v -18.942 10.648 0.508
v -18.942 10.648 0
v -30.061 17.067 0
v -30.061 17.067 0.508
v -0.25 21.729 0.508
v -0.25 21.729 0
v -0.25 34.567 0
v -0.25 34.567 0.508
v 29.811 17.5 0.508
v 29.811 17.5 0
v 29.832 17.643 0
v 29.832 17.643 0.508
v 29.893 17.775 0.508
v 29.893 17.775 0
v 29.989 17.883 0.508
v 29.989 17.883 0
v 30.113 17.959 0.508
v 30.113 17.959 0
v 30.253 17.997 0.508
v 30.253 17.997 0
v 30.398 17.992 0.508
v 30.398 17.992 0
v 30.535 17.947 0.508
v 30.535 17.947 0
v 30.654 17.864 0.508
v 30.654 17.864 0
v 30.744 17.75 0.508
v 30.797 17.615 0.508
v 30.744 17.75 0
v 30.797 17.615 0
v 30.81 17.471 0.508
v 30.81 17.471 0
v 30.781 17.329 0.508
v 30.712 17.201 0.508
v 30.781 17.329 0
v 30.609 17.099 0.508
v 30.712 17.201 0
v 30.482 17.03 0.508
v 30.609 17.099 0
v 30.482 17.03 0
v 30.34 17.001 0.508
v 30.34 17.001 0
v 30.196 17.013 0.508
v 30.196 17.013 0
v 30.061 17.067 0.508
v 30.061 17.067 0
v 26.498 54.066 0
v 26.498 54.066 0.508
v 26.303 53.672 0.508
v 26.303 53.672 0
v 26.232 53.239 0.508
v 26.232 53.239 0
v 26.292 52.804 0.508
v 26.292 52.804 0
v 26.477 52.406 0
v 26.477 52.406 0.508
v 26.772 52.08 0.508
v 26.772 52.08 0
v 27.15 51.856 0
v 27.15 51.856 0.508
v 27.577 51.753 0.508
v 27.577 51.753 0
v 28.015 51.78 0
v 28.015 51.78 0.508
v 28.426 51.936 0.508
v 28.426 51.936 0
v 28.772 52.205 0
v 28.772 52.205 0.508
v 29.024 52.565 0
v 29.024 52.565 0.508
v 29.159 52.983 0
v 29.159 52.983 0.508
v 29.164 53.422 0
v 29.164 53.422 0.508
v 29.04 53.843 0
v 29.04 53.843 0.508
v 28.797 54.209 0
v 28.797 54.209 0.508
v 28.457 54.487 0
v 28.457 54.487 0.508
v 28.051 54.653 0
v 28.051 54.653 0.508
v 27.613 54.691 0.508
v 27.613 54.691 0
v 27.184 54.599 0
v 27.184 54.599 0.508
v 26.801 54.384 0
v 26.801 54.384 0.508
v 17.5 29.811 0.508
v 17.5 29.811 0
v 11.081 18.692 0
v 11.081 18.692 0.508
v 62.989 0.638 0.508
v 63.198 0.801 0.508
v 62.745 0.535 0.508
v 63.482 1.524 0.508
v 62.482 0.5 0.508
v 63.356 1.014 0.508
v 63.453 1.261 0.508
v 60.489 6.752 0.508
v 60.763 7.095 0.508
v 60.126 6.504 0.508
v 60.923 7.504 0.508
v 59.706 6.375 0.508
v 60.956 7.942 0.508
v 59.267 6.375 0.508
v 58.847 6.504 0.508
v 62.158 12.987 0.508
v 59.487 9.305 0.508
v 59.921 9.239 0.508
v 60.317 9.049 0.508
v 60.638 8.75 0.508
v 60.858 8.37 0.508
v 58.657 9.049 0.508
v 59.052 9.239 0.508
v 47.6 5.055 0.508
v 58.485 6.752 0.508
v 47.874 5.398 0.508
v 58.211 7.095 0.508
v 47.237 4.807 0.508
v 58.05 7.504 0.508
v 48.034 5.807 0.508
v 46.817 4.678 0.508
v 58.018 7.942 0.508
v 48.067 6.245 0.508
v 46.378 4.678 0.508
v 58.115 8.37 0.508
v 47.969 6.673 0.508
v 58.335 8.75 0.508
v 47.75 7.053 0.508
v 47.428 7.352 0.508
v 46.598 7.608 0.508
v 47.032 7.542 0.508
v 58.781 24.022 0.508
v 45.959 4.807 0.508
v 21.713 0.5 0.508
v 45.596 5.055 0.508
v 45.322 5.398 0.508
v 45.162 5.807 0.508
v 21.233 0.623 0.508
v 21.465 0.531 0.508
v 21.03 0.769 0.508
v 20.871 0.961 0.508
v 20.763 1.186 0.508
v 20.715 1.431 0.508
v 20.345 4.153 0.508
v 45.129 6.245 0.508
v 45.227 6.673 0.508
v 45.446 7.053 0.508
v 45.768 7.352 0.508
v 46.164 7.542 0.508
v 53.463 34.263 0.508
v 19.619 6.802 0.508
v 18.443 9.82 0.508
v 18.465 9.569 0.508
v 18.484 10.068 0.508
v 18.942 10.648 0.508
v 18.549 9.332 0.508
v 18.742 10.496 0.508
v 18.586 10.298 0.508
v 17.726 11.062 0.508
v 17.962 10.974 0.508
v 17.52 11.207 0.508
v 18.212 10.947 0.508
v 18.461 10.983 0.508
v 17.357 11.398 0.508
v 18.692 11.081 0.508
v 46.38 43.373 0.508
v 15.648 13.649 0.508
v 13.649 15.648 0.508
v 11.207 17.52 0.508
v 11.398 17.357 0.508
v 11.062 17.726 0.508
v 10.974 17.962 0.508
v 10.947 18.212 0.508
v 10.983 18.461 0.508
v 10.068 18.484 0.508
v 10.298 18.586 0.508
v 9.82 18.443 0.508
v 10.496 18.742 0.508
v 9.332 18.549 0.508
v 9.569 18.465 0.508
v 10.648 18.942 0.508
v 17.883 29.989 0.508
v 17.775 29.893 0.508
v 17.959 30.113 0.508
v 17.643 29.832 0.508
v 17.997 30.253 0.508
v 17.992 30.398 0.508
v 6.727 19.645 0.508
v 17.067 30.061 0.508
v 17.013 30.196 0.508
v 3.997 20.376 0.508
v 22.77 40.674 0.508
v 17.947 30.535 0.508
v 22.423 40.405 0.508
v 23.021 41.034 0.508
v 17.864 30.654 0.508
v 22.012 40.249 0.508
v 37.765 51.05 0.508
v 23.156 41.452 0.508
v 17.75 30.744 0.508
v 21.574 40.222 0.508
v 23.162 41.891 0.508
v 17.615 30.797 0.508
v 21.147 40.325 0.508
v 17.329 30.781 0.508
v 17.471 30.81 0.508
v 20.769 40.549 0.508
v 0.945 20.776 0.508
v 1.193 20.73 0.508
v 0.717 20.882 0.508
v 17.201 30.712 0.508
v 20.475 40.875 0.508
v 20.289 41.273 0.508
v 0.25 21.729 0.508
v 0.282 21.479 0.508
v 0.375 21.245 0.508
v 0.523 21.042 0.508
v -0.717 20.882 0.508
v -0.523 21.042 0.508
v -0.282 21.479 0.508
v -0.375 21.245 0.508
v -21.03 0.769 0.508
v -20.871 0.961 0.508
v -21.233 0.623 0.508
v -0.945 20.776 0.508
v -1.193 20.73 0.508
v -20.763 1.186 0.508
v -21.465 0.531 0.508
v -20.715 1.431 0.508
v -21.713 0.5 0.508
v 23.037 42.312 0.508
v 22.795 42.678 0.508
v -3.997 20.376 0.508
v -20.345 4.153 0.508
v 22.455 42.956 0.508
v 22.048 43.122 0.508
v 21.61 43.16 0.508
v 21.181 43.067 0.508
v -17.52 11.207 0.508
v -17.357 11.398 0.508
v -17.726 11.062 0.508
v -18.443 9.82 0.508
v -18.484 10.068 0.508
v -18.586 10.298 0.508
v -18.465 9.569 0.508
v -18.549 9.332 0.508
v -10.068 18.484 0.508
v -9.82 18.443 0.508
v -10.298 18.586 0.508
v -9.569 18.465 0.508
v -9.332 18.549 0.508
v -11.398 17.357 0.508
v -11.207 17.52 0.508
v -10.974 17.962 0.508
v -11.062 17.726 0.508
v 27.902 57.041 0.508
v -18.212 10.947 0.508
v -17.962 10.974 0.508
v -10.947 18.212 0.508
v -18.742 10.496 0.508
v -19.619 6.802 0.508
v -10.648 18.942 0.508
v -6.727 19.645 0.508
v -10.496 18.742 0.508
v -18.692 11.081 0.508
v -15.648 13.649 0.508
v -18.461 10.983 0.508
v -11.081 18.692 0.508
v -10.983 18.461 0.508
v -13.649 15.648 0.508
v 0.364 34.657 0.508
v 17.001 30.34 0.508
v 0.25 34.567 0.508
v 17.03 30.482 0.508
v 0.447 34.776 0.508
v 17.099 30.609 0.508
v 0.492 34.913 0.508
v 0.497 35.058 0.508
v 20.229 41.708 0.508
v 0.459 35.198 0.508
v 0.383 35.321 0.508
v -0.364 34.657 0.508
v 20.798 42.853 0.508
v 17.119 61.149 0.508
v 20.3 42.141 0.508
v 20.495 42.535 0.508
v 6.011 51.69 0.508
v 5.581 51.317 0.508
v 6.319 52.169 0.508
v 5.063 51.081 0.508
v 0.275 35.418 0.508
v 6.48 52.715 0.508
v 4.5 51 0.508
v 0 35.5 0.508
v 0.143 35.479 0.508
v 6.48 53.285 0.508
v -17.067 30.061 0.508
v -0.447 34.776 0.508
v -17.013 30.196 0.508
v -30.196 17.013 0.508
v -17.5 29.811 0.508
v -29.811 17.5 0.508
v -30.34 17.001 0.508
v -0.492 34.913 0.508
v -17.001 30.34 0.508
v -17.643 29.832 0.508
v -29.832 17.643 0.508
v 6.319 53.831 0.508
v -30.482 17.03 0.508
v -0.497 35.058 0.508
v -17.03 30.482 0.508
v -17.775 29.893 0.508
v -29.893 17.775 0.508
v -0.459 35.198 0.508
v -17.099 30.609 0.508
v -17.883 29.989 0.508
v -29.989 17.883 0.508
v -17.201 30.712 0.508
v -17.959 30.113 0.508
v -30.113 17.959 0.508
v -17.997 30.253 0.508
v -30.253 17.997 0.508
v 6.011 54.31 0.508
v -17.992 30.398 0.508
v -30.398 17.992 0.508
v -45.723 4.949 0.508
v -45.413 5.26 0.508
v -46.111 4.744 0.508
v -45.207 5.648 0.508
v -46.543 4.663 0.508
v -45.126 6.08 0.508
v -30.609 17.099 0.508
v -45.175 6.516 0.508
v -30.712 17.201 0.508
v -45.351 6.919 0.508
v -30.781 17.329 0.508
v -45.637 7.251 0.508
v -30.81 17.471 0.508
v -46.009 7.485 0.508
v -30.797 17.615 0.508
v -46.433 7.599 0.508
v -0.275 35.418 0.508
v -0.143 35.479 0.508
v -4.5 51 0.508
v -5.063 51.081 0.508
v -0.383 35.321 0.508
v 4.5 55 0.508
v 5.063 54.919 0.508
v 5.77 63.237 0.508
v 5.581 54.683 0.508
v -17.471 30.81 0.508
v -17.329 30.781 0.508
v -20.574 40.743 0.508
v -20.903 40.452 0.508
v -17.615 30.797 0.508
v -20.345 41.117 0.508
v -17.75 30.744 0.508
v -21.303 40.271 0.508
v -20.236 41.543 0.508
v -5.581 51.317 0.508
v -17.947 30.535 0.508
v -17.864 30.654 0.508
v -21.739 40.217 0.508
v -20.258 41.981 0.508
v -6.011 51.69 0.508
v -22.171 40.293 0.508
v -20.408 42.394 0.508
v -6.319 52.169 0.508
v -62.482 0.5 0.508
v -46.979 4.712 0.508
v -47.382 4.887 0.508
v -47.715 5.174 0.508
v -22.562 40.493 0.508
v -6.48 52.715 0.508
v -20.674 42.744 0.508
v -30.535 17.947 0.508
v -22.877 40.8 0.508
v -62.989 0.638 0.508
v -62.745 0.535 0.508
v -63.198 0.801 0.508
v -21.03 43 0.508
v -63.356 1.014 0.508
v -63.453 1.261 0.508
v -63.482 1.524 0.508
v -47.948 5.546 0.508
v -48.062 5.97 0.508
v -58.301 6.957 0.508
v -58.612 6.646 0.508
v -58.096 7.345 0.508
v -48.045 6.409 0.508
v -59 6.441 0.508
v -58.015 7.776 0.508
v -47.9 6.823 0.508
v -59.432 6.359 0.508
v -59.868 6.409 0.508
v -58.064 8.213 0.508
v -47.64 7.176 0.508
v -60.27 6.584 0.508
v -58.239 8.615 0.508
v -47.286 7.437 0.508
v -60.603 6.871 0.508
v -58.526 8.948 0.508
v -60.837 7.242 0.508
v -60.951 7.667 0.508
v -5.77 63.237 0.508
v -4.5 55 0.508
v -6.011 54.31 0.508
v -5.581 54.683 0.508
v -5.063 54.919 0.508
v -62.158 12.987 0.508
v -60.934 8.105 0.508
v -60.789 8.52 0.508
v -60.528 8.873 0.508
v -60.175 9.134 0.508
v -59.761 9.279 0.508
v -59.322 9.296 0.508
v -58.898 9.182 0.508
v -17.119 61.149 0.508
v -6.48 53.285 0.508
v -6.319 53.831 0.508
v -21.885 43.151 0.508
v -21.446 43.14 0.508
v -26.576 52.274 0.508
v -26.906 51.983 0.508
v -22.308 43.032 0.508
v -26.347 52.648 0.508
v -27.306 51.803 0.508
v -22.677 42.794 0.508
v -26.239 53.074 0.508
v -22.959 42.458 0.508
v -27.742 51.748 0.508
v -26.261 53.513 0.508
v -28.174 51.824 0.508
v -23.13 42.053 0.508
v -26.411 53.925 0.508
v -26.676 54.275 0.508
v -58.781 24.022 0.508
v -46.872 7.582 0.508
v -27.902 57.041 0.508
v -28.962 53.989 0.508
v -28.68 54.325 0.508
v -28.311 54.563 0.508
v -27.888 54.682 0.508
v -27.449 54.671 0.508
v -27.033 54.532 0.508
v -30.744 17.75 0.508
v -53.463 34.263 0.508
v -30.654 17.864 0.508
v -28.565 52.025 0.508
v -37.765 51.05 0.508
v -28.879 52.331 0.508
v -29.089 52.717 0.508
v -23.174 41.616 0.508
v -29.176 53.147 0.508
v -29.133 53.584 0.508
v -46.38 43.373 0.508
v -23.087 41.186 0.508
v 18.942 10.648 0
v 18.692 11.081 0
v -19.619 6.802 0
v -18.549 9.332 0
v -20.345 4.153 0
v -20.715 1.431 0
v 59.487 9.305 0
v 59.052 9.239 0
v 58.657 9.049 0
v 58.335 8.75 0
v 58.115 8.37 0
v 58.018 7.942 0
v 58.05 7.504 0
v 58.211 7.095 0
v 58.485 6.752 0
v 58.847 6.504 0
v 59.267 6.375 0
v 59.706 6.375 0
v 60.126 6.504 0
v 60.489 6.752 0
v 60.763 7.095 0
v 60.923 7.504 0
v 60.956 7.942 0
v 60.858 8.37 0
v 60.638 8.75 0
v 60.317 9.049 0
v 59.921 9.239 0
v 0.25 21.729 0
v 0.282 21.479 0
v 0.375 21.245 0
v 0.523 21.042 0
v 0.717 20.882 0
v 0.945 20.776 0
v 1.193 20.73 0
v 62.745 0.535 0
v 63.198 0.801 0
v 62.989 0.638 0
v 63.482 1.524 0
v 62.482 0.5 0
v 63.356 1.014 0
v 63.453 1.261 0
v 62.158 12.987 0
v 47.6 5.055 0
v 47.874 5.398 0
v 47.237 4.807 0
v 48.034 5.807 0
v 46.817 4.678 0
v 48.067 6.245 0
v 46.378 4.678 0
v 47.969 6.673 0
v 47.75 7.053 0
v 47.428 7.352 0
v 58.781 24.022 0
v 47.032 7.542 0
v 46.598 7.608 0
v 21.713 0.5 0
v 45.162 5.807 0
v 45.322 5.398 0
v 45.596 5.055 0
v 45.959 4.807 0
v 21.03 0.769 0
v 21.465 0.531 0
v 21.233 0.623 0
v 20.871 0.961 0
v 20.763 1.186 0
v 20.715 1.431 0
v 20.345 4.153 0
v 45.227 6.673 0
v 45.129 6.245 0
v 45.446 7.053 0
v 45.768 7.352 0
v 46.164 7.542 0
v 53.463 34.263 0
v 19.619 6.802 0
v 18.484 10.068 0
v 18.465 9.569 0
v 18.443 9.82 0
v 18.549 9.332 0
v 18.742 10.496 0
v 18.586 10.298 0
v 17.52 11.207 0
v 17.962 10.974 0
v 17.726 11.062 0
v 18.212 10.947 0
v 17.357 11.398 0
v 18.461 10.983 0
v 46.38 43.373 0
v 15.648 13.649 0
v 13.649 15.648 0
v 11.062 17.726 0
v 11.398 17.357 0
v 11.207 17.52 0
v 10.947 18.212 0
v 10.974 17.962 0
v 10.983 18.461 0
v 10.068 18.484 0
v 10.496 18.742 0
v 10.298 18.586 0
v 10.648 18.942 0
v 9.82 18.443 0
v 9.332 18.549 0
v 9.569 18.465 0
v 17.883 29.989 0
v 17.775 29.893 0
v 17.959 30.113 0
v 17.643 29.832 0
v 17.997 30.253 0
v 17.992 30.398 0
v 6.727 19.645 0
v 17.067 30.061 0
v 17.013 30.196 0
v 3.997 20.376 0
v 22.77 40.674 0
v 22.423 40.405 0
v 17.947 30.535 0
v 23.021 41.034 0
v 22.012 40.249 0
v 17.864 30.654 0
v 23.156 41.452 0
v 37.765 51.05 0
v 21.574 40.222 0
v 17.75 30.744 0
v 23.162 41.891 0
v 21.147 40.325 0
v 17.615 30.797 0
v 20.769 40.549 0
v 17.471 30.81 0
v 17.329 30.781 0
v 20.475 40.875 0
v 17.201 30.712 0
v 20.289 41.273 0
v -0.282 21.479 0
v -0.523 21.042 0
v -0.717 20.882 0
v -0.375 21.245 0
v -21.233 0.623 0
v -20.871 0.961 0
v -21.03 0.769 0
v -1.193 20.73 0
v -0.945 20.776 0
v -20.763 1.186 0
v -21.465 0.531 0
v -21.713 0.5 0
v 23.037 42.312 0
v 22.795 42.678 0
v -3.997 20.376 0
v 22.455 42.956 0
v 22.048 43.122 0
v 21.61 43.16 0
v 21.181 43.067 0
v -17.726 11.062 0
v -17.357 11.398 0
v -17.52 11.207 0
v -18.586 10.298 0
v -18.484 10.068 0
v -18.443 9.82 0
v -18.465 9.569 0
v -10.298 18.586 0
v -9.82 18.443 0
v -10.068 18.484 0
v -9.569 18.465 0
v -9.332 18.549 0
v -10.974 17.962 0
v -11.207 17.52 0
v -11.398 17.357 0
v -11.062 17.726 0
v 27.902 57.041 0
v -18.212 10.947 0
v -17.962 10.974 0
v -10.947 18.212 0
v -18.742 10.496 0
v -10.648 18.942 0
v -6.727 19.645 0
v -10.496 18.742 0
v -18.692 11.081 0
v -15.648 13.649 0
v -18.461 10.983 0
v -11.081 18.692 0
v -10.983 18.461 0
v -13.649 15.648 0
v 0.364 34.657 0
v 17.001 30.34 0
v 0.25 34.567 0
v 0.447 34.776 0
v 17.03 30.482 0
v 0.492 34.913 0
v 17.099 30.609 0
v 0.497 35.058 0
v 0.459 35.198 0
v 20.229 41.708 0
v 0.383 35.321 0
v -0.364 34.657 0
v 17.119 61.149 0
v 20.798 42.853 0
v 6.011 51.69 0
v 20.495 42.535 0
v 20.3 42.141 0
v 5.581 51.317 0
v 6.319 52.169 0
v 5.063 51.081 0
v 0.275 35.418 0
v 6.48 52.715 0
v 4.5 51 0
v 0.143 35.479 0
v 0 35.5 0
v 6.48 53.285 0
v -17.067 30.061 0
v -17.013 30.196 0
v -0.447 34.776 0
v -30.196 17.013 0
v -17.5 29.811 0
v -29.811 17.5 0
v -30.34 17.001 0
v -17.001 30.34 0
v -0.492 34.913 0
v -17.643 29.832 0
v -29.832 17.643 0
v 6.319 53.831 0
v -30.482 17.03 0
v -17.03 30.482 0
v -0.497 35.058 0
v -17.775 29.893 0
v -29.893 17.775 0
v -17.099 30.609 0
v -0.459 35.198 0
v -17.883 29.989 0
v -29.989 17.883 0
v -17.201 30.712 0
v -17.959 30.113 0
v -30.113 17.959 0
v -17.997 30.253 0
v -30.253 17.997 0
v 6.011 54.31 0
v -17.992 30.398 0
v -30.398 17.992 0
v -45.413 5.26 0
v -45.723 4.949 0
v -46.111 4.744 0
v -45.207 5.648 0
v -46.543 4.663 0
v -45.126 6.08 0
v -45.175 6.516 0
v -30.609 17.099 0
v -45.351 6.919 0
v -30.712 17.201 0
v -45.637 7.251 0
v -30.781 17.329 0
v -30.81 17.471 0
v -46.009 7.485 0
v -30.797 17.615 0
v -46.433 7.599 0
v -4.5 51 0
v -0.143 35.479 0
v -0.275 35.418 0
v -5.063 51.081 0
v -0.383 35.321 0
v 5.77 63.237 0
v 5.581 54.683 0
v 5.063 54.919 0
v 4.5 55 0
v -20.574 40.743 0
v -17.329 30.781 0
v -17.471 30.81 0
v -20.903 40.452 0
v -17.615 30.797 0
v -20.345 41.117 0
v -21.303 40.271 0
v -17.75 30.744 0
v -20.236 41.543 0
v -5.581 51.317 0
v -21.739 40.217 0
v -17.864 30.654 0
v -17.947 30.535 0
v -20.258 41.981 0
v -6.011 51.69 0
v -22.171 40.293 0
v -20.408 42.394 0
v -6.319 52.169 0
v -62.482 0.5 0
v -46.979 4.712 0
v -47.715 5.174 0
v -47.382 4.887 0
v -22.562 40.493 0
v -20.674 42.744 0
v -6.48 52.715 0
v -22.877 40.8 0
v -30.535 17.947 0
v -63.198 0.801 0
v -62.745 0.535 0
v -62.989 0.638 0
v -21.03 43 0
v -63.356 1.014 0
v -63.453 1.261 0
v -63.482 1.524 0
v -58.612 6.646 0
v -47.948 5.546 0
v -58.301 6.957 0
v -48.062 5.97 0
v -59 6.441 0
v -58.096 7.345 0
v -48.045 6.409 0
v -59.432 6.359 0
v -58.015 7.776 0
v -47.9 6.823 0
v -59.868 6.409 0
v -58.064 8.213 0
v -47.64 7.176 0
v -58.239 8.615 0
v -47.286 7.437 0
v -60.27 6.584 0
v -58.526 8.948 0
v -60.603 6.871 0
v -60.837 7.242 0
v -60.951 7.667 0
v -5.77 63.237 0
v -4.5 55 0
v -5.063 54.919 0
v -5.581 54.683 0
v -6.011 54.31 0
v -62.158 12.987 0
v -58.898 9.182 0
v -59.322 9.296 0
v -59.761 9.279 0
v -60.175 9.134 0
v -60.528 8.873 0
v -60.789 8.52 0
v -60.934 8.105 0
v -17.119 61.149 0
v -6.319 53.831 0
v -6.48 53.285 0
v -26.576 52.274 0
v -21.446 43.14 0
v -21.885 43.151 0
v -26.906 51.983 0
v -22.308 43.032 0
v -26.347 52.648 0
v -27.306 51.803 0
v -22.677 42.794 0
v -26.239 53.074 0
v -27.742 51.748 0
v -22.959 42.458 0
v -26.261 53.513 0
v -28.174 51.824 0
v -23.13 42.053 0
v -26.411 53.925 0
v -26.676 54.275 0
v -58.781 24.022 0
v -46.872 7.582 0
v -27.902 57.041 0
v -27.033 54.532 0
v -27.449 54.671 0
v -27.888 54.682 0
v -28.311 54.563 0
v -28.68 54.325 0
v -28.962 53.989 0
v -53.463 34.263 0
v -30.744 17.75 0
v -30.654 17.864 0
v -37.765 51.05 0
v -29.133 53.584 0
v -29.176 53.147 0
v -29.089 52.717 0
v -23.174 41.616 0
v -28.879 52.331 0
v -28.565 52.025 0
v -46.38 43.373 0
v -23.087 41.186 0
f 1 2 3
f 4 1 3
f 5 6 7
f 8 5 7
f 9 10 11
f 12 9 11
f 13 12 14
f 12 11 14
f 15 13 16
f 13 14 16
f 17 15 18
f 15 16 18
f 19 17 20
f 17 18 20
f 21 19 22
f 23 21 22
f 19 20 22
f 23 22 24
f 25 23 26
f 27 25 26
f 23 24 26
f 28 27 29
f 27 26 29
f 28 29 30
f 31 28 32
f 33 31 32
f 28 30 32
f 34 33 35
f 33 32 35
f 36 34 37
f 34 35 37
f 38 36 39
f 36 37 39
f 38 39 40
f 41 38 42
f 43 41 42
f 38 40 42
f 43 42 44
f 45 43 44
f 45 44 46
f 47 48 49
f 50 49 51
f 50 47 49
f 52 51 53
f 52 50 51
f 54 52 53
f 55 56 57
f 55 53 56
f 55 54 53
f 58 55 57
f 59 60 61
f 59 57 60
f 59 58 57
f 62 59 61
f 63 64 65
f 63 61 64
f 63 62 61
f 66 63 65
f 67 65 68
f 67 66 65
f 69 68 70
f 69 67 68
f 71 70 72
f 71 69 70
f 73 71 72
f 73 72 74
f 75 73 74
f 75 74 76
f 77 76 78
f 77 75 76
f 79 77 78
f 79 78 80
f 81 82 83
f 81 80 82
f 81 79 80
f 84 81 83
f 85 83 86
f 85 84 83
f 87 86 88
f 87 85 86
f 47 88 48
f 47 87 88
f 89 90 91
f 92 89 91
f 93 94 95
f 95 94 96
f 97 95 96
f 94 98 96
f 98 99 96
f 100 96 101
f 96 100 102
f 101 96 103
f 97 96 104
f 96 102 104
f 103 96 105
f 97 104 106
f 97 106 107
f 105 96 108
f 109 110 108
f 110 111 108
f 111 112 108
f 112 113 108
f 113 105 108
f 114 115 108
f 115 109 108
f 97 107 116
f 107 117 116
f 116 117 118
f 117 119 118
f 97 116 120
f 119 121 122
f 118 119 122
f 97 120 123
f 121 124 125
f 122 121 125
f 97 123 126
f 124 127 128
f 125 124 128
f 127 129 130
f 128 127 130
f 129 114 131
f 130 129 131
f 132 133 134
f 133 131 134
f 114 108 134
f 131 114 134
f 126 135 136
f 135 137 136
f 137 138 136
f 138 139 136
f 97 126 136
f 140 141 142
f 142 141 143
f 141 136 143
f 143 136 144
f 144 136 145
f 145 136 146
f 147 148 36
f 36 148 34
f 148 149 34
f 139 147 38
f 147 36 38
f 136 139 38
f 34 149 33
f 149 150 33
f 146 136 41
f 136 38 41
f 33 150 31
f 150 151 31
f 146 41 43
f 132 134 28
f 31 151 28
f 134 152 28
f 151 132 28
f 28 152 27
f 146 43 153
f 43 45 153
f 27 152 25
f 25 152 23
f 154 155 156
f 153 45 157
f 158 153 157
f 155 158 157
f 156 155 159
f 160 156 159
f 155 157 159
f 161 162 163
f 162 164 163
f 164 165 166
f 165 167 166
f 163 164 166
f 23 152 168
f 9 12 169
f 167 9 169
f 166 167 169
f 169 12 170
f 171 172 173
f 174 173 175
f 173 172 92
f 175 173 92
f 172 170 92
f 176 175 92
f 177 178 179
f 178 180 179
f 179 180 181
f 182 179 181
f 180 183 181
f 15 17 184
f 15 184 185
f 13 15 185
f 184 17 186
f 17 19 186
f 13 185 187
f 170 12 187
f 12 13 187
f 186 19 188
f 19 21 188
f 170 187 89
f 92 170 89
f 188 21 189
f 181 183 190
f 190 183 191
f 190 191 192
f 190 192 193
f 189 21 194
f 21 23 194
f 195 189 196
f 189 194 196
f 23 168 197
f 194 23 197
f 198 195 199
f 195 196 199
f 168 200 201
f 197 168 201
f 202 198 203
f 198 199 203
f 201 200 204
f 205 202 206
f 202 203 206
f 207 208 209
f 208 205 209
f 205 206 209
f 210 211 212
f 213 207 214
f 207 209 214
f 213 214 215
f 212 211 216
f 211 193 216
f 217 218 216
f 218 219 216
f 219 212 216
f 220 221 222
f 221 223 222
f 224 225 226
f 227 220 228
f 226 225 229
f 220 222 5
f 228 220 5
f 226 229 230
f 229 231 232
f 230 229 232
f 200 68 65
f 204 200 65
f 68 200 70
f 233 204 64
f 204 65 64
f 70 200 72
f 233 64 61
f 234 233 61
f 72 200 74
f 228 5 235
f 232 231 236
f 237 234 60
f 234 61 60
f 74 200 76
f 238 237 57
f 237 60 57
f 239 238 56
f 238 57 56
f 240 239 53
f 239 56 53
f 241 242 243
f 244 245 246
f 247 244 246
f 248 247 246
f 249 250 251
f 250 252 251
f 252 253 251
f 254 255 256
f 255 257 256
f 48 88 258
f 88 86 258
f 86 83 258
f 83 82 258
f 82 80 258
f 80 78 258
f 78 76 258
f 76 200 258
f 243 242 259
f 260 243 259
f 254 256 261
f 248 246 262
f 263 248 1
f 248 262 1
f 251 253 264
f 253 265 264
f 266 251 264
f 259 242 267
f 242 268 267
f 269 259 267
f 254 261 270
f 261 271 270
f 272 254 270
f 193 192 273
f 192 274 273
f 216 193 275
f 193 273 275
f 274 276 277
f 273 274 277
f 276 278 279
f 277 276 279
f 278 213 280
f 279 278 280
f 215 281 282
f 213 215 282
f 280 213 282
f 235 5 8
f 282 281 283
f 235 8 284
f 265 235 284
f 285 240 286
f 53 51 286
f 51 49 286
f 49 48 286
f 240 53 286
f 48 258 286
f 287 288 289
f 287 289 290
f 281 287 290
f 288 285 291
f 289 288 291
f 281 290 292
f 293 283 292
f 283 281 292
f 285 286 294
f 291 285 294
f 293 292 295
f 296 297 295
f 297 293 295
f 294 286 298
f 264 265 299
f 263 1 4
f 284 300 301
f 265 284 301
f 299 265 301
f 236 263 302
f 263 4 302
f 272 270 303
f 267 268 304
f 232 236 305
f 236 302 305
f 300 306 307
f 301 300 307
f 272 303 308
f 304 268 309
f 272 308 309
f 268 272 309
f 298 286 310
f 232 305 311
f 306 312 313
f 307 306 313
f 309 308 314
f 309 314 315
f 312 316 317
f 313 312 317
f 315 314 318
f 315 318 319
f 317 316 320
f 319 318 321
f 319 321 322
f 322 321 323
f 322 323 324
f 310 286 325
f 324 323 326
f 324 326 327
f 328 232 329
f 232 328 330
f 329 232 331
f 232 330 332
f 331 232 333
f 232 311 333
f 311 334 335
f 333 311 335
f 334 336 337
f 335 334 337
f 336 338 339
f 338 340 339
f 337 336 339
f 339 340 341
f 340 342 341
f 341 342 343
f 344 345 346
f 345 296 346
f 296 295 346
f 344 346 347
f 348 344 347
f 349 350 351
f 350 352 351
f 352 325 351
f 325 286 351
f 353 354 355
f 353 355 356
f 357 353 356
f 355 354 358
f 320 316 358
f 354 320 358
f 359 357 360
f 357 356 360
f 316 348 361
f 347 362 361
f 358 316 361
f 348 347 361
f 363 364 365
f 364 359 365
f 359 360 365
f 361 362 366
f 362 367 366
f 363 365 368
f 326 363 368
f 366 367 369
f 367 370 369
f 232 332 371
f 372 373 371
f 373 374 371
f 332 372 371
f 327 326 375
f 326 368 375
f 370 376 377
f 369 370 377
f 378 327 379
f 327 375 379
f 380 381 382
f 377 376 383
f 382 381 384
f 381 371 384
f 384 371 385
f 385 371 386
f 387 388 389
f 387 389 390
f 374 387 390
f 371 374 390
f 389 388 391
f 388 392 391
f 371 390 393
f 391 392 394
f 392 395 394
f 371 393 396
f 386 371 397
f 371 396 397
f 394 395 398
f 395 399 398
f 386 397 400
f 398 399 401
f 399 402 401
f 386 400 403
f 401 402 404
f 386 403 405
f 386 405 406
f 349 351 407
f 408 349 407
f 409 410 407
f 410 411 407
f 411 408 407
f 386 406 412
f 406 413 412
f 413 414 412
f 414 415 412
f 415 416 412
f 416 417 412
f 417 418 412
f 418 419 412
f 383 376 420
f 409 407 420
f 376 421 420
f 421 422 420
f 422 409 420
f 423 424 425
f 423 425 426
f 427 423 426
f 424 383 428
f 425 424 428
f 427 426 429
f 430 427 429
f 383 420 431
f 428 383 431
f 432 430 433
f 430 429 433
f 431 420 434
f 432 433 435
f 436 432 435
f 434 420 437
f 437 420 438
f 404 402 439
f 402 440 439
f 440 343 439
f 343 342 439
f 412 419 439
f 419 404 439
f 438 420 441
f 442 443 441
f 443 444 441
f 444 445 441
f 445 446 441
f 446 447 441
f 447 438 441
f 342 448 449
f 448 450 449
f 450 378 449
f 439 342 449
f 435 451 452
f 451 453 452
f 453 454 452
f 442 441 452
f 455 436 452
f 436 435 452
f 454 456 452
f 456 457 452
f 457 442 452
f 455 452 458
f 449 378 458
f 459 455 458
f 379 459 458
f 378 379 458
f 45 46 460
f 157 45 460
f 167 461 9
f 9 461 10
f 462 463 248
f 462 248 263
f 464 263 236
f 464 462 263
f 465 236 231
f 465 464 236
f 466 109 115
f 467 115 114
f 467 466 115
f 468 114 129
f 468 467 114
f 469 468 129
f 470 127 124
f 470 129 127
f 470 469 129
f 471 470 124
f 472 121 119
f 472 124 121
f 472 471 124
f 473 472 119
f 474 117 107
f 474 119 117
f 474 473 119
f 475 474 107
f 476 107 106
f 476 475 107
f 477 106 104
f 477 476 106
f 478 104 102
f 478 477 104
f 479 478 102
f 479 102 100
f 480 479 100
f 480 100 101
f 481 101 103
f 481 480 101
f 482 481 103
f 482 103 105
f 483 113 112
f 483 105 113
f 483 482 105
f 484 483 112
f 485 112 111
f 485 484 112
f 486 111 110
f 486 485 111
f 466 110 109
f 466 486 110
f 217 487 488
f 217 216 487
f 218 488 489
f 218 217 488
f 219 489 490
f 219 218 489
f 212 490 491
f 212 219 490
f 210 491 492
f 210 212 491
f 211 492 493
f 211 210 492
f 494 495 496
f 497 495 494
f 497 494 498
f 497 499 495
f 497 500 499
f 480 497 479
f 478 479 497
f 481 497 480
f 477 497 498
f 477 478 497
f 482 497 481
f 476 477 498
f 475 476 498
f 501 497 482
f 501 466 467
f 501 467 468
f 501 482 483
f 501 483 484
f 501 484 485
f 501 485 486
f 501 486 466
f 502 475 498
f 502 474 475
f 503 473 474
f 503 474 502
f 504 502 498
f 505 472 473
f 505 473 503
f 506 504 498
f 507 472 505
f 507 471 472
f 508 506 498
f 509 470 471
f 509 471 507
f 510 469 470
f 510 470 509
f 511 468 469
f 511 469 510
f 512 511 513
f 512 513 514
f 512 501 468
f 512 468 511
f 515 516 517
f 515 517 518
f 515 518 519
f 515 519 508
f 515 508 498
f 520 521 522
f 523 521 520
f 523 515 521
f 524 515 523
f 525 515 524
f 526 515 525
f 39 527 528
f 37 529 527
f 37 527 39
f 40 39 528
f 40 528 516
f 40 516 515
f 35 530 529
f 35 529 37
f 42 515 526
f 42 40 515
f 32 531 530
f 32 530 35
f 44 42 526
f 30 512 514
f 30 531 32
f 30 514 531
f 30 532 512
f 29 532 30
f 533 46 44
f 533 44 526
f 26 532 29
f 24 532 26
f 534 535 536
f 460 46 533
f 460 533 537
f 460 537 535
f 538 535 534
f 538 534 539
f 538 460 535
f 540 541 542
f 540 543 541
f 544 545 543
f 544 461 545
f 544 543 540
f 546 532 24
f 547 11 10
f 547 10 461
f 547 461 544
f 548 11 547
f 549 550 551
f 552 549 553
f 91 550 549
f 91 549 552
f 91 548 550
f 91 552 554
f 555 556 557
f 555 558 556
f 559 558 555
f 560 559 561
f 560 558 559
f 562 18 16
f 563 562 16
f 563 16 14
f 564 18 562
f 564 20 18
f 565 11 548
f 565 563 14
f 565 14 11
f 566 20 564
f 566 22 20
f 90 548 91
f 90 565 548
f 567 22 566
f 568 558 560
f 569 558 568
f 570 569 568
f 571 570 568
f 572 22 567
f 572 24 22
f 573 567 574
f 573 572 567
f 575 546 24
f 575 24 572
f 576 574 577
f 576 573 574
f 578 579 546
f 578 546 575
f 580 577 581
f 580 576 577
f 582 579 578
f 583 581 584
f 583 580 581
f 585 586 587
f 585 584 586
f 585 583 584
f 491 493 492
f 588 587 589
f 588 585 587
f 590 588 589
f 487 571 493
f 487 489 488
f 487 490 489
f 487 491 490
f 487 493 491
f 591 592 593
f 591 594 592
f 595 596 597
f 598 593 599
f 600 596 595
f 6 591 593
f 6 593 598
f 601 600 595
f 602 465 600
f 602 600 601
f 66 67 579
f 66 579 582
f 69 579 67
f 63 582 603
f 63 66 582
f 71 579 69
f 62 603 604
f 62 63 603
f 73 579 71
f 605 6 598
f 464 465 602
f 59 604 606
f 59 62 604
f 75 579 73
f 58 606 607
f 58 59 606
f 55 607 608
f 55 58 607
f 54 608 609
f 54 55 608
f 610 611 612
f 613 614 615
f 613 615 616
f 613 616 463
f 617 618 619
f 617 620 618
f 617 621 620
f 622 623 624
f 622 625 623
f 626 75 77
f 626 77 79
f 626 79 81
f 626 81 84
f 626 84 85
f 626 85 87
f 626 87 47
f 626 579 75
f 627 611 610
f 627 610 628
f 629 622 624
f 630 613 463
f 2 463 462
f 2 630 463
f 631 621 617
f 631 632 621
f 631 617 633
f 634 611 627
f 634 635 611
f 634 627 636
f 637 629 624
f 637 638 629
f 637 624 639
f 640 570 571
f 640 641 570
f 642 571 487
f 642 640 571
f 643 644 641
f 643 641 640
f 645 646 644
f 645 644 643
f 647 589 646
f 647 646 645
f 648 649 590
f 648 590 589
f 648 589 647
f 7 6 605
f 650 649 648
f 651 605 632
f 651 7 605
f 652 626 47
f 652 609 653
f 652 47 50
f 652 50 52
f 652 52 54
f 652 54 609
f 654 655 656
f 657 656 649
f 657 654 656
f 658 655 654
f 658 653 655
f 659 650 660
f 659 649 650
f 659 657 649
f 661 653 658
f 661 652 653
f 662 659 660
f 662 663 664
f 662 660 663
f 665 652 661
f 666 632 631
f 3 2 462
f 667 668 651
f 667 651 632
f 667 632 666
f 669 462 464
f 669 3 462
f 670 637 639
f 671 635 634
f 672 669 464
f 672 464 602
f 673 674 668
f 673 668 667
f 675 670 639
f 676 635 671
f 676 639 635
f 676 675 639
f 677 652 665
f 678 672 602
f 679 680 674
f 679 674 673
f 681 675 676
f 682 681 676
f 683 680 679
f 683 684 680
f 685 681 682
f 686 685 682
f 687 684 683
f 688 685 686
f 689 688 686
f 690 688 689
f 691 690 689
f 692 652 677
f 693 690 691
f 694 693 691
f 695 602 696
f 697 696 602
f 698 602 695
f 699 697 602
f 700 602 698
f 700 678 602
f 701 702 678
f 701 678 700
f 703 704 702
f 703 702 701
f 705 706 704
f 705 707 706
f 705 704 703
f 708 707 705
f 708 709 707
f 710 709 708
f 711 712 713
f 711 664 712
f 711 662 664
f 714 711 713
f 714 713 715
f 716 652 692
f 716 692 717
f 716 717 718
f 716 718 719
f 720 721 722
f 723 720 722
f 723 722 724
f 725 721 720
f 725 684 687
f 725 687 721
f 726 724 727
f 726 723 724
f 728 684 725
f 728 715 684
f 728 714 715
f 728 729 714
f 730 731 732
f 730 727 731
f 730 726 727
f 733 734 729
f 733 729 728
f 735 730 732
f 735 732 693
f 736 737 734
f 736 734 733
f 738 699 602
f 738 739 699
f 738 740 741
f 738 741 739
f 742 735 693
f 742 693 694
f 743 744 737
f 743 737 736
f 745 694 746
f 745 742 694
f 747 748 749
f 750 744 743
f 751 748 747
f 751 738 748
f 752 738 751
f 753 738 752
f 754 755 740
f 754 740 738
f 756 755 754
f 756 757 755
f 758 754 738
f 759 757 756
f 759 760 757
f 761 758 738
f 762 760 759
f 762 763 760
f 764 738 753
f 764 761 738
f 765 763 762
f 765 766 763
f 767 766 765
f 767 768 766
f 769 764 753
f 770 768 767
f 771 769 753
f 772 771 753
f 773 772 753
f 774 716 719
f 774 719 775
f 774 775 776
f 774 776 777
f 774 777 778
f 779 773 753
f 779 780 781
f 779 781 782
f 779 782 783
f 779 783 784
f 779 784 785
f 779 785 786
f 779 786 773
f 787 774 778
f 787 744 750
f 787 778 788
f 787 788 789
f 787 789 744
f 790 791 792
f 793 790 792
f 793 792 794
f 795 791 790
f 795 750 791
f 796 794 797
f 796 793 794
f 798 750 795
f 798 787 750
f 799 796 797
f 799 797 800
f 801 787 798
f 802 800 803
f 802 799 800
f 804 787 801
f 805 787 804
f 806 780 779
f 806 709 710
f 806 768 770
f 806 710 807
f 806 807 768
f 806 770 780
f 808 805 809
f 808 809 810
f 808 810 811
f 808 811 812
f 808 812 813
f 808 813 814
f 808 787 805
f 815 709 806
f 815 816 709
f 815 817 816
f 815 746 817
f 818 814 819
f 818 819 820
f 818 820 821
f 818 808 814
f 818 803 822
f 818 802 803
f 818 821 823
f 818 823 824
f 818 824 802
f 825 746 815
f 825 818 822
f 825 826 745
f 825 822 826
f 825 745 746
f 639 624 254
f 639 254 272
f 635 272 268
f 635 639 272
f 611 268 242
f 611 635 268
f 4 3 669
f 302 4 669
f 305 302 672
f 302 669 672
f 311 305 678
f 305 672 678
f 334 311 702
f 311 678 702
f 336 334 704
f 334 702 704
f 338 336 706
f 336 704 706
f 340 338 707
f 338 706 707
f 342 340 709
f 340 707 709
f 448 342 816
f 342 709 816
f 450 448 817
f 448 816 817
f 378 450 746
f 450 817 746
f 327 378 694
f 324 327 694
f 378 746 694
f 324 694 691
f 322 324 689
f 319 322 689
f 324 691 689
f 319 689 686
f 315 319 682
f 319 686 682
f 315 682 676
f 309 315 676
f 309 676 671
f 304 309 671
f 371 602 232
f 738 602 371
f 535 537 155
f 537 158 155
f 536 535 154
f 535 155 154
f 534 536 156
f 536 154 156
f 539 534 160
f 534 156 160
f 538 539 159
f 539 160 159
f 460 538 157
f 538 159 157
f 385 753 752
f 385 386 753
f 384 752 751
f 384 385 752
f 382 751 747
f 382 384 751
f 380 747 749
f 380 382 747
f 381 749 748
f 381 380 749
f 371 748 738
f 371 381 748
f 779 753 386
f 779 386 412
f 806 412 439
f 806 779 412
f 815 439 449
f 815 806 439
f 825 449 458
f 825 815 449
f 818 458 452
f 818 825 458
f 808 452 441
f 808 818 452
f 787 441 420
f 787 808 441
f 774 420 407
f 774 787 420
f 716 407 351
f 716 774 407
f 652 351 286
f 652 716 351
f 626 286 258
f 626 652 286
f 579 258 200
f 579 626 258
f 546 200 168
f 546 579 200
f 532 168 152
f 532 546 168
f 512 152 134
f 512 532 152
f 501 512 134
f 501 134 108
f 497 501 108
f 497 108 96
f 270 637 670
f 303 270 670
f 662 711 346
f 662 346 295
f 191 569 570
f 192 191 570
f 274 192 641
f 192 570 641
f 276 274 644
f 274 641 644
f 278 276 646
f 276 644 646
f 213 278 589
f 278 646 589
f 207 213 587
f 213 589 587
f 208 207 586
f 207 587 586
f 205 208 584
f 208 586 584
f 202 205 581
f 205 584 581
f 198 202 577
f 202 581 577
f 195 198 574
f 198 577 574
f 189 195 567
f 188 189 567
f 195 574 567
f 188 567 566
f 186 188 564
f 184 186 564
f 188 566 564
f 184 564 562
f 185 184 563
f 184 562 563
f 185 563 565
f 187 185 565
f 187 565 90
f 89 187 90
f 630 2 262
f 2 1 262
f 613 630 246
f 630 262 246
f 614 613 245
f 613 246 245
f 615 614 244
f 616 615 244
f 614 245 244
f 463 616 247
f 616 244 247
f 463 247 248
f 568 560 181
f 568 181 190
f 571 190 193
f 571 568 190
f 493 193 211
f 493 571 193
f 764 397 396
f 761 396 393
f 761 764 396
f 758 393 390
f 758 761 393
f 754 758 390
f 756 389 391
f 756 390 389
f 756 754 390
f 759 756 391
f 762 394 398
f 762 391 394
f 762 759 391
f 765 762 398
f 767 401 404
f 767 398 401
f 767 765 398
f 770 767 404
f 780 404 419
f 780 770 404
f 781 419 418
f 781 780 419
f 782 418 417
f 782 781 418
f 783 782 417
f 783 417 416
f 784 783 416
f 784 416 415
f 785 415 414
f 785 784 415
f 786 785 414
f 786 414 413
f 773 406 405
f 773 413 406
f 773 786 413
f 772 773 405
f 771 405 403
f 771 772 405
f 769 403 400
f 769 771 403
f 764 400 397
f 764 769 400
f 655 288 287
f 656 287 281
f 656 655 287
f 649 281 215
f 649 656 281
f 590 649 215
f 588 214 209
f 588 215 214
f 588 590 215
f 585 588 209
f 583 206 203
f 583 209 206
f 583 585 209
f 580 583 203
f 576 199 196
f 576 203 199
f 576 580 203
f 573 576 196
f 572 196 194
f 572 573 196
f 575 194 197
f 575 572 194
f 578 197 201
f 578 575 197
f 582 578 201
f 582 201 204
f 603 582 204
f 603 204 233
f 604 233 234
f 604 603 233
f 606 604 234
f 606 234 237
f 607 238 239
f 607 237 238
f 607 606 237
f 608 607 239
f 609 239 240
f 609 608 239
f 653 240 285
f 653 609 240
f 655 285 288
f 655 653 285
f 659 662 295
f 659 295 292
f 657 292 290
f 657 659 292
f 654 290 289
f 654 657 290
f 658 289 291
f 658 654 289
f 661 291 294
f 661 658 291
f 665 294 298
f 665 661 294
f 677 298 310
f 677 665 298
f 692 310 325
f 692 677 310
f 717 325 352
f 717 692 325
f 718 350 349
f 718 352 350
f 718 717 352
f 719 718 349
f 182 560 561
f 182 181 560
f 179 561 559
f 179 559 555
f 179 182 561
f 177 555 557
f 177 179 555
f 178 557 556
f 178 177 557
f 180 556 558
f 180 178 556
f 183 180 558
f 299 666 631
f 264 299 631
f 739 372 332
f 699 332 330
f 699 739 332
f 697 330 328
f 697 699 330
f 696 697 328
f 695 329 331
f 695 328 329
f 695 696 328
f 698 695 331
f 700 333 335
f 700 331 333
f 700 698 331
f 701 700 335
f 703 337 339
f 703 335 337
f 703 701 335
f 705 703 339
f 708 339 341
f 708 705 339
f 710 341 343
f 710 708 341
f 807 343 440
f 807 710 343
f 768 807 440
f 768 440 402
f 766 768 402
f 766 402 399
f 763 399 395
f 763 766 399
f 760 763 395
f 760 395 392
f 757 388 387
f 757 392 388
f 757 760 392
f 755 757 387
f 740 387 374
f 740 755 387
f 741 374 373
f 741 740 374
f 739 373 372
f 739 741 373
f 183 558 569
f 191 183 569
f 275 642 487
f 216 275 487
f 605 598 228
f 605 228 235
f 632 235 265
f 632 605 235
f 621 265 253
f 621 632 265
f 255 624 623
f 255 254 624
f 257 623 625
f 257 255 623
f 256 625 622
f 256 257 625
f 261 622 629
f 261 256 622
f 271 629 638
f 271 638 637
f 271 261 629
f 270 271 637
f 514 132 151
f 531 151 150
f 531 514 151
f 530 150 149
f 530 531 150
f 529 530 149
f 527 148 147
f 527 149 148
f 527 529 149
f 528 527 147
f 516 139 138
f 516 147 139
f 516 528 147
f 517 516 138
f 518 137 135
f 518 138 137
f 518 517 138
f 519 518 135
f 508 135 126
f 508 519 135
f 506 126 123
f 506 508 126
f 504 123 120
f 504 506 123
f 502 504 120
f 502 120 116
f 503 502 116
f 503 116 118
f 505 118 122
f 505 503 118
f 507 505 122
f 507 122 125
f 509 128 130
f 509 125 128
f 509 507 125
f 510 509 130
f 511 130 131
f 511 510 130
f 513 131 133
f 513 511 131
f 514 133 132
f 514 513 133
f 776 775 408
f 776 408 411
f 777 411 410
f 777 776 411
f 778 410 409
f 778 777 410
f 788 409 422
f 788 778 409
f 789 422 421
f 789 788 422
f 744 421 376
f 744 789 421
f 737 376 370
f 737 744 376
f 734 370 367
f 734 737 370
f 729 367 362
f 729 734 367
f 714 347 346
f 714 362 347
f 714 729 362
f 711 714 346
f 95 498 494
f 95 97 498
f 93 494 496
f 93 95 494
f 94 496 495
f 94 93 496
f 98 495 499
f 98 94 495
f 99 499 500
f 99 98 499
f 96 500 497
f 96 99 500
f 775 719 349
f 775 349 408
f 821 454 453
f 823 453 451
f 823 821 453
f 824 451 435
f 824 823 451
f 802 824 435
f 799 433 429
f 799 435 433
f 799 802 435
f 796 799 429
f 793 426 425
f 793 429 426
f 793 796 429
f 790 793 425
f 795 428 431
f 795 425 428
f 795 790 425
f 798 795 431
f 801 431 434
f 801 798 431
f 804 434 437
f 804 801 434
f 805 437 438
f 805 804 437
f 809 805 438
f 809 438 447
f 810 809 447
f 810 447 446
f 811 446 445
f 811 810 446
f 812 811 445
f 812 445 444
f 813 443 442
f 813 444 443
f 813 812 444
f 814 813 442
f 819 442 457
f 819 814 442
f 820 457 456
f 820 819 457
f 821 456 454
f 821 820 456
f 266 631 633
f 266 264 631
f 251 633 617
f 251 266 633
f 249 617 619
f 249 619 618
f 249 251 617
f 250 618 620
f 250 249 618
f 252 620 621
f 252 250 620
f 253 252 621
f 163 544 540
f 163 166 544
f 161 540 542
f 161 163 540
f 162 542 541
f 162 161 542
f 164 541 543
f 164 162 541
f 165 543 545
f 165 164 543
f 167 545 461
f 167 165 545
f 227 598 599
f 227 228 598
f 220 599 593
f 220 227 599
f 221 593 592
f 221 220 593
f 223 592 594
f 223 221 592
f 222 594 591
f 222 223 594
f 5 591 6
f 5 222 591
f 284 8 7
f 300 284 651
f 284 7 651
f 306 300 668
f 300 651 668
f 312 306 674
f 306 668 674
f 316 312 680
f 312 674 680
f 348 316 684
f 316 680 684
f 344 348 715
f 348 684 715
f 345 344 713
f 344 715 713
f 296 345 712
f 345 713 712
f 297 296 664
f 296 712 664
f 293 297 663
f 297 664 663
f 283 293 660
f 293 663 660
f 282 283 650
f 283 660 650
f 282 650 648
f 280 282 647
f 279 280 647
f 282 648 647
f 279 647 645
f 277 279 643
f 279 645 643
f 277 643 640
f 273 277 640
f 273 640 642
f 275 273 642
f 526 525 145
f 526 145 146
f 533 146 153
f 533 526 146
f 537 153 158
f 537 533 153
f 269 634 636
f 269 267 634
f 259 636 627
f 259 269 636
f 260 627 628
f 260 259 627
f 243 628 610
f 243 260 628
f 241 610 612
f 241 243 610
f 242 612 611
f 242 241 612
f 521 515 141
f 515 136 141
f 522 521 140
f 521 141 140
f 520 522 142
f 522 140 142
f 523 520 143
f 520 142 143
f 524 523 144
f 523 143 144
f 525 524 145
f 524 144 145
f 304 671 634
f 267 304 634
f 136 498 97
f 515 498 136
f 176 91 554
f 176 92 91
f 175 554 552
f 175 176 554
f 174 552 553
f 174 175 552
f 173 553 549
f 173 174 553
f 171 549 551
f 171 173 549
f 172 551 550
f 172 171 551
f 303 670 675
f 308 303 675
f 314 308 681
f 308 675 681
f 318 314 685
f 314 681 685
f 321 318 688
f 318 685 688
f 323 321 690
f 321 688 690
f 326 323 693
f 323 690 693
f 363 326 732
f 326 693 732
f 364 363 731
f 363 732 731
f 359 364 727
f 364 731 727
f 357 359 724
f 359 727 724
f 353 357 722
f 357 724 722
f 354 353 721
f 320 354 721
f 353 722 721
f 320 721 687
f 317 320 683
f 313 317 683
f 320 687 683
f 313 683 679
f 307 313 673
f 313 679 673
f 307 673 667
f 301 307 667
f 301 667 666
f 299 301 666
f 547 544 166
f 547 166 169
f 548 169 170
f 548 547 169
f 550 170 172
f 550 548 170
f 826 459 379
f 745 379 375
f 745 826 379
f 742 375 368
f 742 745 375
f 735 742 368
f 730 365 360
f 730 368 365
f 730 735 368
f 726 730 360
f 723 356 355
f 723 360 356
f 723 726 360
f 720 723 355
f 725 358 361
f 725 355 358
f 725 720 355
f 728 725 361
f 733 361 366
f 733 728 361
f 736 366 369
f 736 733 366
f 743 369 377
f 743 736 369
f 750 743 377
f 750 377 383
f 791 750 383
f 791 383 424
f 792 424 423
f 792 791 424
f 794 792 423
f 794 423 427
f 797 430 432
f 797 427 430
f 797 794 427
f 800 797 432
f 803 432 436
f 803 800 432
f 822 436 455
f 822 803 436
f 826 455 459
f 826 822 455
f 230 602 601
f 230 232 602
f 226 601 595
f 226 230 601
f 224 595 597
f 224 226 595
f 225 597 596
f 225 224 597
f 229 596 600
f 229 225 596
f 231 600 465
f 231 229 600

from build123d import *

# Parameters (mm, degrees)
BOSS_EXTRUDE1_DEPTH            = 0.508
CUT_EXTRUDE1_DEPTH             = 1.508
CIRPATTERN1_COUNT              = 5
CIRPATTERN1_ANGLE              = 120
FILLET1_R                      = 1
F_4_CLEARANCE_HOLE1_AT_2_COUNT = 2
F_4_CLEARANCE_HOLE1_AT_2_PITCH = 13
CIRPATTERN2_COUNT              = 4
CIRPATTERN2_ANGLE              = 165
CUT_EXTRUDE2_DEPTH             = 1.508


with BuildPart() as part:
    # Sketch1 → Boss-Extrude1 (new body)
    with BuildSketch(Plane.XY):
        with BuildLine():
            Line((63.498031466, 0.5), (20.758479237, 0.5))
            ThreePointArc((20.758479237, 0.5), (0, 20.7645), (-20.758479237, 0.5))
            Line((-20.758479237, 0.5), (-63.498031466, 0.5))
            ThreePointArc((-63.498031466, 0.5), (0, 63.5), (63.498031466, 0.5))
        make_face()
    extrude(amount=BOSS_EXTRUDE1_DEPTH)

    # Sketch2 → Cut-Extrude1 (cut, through all)
    with BuildSketch(Plane(origin=(0, 0, 0), x_dir=(-1, 0, 0), z_dir=(0, 0, -1))):
        with BuildLine():
            Line((29.810889132, 17.5), (17.856281105, 10.598003837))
            Line((17.856281105, 10.598003837), (18.106281105, 10.164991136))
            Line((18.106281105, 10.164991136), (30.060889132, 17.066987298))
            ThreePointArc((30.060889132, 17.066987298), (30.743901834, 17.75), (29.810889132, 17.5))
        make_face()
    cut_extrude1 = extrude(amount=-CUT_EXTRUDE1_DEPTH, mode=Mode.SUBTRACT)

    # CirPattern1: Cut-Extrude1 ×5 about axis
    cirpattern1_axis = Axis((0, 0, 0), (0, 0, -1))
    for i in range(1, CIRPATTERN1_COUNT):
        add(cut_extrude1.rotate(cirpattern1_axis, i * CIRPATTERN1_ANGLE / (CIRPATTERN1_COUNT - 1)), mode=Mode.SUBTRACT)

    # Fillet1
    fillet1_edges = [part.edges().sort_by_distance(p)[0] for p in [
        (-18.106281105, 10.164991136, 0.254),
        (-17.856281105, 10.598003837, 0.254),
        (-10.598003837, 17.856281105, 0.254),
        (-10.164991136, 18.106281105, 0.254),
        (-0.25, 20.762994973, 0.254),
        (0.25, 20.762994973, 0.254),
        (10.164991136, 18.106281105, 0.254),
        (10.598003837, 17.856281105, 0.254),
        (18.106281105, 10.164991136, 0.254),
        (17.856281105, 10.598003837, 0.254),
        (63.498031466, 0.5, 0.254),
        (20.758479237, 0.5, 0.254),
        (-63.498031466, 0.5, 0.254),
        (-20.758479237, 0.5, 0.254),
    ]]
    fillet(fillet1_edges, radius=FILLET1_R)

    # Sketch3 → #4 Clearance Hole1 (revolve, cut)
    with BuildSketch(Plane(origin=(59.486691682, 7.831571533, 0), x_dir=(0, 1, 0), z_dir=(1, 0, 0))):
        Polygon((0, 0), (0, 136.775187864), (1.4732, 135.89), (1.4732, 0), align=None)
    f_4_clearance_hole1 = revolve(axis=Axis((59.486691682, 7.831571533, -6.35), (0, 0, 1)), mode=Mode.SUBTRACT)

    # #4 Clearance Hole1 at 2: #4 Clearance Hole1 ×2
    with Locations(*[Vector(-0.991444861, -0.130526192, 0) * (i * F_4_CLEARANCE_HOLE1_AT_2_PITCH) for i in range(1, F_4_CLEARANCE_HOLE1_AT_2_COUNT)]):
        add(f_4_clearance_hole1, mode=Mode.SUBTRACT)

    # CirPattern2: #4 Clearance Hole1 ×4 about axis
    cirpattern2_axis = Axis((0, 0, 0), (0, 0, 1))
    for i in range(1, CIRPATTERN2_COUNT):
        add(f_4_clearance_hole1.rotate(cirpattern2_axis, i * CIRPATTERN2_ANGLE / (CIRPATTERN2_COUNT - 1)), mode=Mode.SUBTRACT)

    # CirPattern2 copy 1 sketch → CirPattern2 copy 1 (revolve, cut)
    with BuildSketch(Plane(origin=(21.702184822, 41.689509159, 0), x_dir=(-0.819152044, 0.573576436, 0), z_dir=(0.573576436, 0.819152044, 0))):
        Polygon((0, 0), (0, 136.775187864), (1.4732, 135.89), (1.4732, 0), align=None)
    revolve(axis=Axis((21.702184822, 41.689509159, -6.35), (0, 0, 1)), mode=Mode.SUBTRACT)

    # CirPattern2 copy 2 sketch → CirPattern2 copy 2 (revolve, cut)
    with BuildSketch(Plane(origin=(-21.702184822, 41.689509159, 0), x_dir=(-0.939692621, -0.342020143, 0), z_dir=(-0.342020143, 0.939692621, 0))):
        Polygon((0, 0), (0, 136.775187864), (1.4732, 135.89), (1.4732, 0), align=None)
    revolve(axis=Axis((-21.702184822, 41.689509159, -6.35), (0, 0, 1)), mode=Mode.SUBTRACT)

    # CirPattern2 copy 3 sketch → CirPattern2 copy 3 (revolve, cut)
    with BuildSketch(Plane(origin=(-46.597908485, 6.134731034, 0), x_dir=(-0.258819045, -0.965925826, 0), z_dir=(-0.965925826, 0.258819045, 0))):
        Polygon((0, 0), (0, 136.775187864), (1.4732, 135.89), (1.4732, 0), align=None)
    revolve(axis=Axis((-46.597908485, 6.134731034, -6.35), (0, 0, 1)), mode=Mode.SUBTRACT)

    # Sketch5 → Cut-Extrude2 (cut, through all)
    with BuildSketch(Plane(origin=(0, 0, 0), x_dir=(-1, 0, 0), z_dir=(0, 0, -1))):
        with BuildLine():
            Line((-4.5, 55), (4.5, 55))
            ThreePointArc((4.5, 55), (6.5, 53), (4.5, 51))
            Line((4.5, 51), (-4.5, 51))
            ThreePointArc((-4.5, 51), (-6.5, 53), (-4.5, 55))
        make_face()
    extrude(amount=-CUT_EXTRUDE2_DEPTH, mode=Mode.SUBTRACT)


solid = part.part
